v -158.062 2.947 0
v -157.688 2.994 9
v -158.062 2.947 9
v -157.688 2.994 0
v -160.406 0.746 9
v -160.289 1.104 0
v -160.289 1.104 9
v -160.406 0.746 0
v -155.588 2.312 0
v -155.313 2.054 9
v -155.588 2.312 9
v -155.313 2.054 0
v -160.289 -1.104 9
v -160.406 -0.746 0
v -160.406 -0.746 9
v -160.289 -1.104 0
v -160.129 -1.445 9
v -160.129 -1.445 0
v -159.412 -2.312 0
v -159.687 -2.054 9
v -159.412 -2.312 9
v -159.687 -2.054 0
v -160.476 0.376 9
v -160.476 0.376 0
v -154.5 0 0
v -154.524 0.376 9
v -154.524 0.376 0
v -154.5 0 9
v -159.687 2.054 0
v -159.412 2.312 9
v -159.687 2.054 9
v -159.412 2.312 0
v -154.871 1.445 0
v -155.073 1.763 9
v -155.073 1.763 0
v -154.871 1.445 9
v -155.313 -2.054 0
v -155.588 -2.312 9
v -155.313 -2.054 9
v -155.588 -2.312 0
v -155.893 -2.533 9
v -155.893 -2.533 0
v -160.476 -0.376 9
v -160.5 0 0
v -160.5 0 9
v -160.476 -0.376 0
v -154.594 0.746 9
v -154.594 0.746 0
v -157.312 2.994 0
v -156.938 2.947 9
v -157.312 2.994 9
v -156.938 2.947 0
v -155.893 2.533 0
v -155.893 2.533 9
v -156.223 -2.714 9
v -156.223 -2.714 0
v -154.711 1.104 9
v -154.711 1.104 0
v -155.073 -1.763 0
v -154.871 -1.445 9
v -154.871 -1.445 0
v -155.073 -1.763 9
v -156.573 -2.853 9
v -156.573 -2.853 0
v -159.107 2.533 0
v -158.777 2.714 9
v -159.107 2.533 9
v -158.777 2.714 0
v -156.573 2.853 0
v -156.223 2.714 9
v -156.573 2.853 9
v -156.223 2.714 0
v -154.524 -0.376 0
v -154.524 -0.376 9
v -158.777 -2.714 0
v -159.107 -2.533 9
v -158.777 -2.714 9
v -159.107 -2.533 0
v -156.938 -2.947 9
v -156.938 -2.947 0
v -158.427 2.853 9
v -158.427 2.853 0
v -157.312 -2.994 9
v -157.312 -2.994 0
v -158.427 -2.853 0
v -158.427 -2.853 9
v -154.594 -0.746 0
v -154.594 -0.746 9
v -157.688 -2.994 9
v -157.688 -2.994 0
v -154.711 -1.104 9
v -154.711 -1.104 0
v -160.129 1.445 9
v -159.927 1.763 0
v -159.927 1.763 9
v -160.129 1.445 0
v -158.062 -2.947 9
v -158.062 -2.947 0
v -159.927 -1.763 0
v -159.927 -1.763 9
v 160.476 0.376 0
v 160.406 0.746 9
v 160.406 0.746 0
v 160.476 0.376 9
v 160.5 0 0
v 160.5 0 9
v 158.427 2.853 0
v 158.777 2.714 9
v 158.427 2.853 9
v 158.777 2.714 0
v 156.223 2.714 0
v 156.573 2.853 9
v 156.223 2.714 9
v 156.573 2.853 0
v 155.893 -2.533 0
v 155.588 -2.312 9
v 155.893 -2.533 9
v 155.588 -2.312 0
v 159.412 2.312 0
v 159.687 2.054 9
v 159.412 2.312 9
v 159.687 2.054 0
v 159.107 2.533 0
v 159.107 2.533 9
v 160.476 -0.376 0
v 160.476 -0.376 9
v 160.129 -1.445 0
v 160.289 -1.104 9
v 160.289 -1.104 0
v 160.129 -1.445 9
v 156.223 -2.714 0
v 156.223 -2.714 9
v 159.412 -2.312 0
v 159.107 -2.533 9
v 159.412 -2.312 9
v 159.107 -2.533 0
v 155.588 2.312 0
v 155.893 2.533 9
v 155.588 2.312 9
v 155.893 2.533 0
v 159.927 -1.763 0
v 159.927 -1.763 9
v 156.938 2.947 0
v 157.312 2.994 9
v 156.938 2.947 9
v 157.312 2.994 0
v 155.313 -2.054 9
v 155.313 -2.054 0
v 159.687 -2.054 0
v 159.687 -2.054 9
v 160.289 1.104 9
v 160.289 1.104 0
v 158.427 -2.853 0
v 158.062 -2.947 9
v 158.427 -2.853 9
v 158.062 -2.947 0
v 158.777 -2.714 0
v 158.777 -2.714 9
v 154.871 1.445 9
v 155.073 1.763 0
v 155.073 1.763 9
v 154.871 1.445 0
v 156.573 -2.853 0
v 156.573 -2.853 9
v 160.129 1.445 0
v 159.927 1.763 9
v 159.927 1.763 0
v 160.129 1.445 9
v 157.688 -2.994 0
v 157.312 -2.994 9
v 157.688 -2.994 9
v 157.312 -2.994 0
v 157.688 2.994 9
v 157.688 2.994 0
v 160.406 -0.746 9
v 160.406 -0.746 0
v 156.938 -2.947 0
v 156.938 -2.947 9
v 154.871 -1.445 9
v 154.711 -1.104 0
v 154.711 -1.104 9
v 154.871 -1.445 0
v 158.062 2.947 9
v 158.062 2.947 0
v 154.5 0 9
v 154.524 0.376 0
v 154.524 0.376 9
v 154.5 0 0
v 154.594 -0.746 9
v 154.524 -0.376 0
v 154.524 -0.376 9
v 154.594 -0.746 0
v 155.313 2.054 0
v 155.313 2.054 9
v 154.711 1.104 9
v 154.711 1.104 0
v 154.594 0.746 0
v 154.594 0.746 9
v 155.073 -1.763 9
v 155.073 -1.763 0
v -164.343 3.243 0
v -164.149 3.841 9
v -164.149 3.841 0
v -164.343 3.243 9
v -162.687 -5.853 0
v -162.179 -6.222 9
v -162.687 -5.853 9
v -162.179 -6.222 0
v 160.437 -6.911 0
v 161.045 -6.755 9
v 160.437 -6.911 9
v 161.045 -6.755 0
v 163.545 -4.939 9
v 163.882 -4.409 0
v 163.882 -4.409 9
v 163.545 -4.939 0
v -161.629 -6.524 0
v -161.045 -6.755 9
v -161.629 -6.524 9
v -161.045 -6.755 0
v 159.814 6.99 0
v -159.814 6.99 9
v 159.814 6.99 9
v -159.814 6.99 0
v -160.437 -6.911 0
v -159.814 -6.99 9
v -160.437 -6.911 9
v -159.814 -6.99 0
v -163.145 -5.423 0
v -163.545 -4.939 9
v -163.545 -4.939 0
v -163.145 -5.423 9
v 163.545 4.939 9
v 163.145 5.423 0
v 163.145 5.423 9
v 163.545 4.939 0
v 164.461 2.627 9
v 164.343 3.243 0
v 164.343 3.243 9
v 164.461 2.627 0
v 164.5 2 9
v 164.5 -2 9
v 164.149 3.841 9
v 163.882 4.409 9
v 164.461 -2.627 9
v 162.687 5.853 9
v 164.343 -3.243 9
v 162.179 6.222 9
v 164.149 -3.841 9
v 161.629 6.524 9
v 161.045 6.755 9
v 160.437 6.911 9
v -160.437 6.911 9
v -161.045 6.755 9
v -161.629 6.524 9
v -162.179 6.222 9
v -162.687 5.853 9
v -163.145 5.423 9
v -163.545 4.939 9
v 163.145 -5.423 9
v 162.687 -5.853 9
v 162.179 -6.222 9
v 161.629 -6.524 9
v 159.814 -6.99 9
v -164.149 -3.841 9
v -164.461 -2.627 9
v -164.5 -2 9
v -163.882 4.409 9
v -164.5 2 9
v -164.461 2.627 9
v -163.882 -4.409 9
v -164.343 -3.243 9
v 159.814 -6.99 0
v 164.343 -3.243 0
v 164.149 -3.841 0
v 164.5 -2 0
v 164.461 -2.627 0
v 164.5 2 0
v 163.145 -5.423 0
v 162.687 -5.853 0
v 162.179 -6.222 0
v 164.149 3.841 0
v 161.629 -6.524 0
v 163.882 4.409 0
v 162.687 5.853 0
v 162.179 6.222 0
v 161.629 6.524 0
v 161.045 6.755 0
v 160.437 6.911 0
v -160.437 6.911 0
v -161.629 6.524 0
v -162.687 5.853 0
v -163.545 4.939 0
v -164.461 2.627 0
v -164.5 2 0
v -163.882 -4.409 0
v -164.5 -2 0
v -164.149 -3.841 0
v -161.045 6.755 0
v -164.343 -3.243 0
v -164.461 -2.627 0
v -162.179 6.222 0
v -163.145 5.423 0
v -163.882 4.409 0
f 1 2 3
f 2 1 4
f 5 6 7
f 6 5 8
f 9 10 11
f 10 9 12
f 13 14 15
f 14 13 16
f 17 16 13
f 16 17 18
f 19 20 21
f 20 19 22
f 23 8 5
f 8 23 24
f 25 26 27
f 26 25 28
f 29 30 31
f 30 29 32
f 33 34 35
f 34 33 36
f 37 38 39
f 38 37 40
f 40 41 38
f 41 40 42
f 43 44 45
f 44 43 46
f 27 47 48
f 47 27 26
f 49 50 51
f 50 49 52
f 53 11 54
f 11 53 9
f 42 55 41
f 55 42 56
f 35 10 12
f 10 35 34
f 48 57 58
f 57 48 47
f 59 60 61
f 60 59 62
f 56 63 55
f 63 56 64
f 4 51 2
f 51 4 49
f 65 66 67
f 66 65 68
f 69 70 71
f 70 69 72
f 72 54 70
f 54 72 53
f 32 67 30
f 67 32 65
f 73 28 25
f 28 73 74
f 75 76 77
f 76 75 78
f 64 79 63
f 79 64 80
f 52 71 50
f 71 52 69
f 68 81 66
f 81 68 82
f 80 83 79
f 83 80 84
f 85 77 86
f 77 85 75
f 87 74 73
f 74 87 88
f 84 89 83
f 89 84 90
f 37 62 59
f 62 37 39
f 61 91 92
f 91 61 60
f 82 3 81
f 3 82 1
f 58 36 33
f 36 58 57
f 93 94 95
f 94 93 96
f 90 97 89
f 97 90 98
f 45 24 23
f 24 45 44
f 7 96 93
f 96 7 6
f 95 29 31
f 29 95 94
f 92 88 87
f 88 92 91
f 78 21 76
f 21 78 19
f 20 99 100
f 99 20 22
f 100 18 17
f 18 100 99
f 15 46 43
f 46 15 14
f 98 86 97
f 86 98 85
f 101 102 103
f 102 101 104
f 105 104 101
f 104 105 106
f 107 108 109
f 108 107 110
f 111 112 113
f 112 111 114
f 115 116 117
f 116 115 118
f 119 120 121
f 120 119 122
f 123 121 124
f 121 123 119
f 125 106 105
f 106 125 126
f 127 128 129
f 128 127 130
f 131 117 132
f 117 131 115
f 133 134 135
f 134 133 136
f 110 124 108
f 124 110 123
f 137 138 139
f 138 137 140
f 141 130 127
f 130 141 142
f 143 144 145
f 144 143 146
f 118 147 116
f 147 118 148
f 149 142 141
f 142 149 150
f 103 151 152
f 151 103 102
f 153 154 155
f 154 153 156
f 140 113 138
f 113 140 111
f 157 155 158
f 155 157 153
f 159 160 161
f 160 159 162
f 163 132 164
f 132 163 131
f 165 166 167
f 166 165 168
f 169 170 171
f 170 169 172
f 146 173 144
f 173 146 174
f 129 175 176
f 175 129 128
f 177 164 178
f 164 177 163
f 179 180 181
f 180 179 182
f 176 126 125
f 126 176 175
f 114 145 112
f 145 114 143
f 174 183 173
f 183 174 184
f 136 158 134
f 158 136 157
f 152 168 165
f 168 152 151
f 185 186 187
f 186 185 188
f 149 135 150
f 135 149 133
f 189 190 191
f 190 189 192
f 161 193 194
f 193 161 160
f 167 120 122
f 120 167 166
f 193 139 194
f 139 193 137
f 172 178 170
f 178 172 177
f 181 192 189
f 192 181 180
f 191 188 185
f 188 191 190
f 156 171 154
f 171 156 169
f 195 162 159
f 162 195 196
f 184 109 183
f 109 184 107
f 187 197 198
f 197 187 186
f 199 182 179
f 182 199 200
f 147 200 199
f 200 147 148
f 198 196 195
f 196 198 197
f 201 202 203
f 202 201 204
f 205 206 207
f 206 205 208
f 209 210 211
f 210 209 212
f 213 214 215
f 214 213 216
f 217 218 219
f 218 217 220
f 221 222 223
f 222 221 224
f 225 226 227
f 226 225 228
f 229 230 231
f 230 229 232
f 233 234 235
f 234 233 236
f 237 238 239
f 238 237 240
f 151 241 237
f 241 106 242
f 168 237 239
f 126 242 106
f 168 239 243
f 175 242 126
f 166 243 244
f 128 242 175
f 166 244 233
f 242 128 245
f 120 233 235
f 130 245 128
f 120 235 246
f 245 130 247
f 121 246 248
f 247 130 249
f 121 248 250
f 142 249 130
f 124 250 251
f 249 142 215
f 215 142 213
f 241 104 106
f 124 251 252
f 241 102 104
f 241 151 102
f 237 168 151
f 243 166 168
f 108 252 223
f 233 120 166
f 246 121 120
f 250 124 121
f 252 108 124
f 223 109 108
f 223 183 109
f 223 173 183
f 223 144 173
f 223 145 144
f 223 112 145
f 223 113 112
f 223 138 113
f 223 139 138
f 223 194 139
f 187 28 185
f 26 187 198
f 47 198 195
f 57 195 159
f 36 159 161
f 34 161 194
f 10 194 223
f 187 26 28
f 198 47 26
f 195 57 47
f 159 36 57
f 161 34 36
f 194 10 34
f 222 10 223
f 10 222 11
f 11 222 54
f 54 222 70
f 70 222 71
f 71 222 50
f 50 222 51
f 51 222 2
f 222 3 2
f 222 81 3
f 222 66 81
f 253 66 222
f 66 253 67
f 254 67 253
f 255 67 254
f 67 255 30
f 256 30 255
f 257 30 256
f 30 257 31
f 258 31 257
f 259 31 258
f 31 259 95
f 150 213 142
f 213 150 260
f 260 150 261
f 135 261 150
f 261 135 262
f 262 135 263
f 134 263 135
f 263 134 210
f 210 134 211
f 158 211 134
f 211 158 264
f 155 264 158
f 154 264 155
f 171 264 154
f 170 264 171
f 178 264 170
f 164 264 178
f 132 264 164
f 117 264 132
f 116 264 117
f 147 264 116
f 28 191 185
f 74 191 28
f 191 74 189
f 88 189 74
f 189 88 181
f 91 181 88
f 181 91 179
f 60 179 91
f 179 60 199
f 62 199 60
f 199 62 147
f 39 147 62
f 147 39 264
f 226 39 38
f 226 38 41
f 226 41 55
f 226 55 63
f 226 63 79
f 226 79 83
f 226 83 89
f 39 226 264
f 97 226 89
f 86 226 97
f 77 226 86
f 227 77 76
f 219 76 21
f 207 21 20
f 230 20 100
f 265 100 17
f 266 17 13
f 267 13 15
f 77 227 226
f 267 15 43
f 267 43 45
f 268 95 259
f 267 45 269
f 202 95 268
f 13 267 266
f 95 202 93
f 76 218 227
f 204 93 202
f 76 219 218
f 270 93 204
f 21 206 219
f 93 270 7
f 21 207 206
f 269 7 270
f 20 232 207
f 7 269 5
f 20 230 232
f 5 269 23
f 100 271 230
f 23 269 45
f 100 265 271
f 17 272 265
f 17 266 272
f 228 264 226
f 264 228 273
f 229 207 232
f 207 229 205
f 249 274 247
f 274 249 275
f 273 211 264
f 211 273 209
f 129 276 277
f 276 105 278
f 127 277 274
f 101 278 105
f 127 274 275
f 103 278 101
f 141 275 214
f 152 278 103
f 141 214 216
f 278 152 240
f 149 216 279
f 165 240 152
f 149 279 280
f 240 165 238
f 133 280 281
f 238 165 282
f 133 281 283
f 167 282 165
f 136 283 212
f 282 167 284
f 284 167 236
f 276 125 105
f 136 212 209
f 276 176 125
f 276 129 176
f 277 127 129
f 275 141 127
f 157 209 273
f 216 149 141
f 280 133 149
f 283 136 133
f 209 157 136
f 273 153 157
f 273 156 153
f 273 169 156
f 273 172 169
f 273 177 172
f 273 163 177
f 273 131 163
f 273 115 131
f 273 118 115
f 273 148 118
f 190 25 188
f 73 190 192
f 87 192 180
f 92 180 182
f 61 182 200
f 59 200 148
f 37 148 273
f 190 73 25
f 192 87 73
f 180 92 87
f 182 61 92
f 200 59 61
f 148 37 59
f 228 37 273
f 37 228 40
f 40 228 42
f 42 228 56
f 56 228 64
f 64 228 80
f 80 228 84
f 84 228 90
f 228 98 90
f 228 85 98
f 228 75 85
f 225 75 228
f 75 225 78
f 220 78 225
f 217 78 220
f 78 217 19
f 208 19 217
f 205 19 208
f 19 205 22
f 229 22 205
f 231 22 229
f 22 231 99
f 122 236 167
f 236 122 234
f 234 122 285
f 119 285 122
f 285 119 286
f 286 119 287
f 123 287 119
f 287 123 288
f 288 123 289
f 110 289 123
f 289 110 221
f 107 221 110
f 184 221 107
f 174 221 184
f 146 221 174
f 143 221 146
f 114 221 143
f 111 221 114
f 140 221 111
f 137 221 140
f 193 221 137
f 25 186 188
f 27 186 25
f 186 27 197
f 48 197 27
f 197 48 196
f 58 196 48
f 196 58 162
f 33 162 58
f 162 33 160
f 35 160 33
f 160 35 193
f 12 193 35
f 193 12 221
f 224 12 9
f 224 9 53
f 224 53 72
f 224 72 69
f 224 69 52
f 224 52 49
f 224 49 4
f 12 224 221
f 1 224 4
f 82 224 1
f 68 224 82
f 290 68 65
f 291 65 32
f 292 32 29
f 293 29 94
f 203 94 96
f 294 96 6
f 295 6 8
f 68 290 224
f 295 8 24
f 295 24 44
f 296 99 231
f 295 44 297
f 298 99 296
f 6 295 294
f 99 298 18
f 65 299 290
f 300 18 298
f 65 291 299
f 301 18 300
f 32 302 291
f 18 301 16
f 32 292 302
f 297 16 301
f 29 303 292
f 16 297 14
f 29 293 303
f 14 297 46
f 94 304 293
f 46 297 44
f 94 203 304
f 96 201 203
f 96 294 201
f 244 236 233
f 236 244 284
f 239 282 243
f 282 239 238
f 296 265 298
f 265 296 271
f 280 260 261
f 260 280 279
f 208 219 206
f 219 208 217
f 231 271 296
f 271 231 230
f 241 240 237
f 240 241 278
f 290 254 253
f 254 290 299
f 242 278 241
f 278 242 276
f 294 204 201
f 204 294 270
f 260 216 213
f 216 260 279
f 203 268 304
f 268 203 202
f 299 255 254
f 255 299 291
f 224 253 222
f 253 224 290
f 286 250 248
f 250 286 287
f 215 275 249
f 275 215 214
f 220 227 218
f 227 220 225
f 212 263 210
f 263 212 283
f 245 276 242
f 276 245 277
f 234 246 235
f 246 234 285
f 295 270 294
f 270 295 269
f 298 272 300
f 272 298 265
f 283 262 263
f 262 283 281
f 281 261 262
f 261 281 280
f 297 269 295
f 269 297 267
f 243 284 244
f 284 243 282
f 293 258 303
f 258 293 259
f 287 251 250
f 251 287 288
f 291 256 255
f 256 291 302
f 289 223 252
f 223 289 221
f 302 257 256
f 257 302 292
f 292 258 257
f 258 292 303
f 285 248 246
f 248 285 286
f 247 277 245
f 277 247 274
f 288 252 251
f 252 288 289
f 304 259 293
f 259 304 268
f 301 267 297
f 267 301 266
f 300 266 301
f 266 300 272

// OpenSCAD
$fn = 50;


difference() {
	union() {
		hull() {
			translate(v = [-159.5000000000, 2.0000000000, 0]) {
				cylinder(h = 9, r = 5);
			}
			translate(v = [159.5000000000, 2.0000000000, 0]) {
				cylinder(h = 9, r = 5);
			}
			translate(v = [-159.5000000000, -2.0000000000, 0]) {
				cylinder(h = 9, r = 5);
			}
			translate(v = [159.5000000000, -2.0000000000, 0]) {
				cylinder(h = 9, r = 5);
			}
		}
	}
	union() {
		translate(v = [-157.5000000000, 0.0000000000, -100.0000000000]) {
			cylinder(h = 200, r = 3.0000000000);
		}
		translate(v = [-157.5000000000, 0.0000000000, -100.0000000000]) {
			cylinder(h = 200, r = 3.0000000000);
		}
		translate(v = [157.5000000000, 0.0000000000, -100.0000000000]) {
			cylinder(h = 200, r = 3.0000000000);
		}
		translate(v = [157.5000000000, 0.0000000000, -100.0000000000]) {
			cylinder(h = 200, r = 3.0000000000);
		}
	}
}
